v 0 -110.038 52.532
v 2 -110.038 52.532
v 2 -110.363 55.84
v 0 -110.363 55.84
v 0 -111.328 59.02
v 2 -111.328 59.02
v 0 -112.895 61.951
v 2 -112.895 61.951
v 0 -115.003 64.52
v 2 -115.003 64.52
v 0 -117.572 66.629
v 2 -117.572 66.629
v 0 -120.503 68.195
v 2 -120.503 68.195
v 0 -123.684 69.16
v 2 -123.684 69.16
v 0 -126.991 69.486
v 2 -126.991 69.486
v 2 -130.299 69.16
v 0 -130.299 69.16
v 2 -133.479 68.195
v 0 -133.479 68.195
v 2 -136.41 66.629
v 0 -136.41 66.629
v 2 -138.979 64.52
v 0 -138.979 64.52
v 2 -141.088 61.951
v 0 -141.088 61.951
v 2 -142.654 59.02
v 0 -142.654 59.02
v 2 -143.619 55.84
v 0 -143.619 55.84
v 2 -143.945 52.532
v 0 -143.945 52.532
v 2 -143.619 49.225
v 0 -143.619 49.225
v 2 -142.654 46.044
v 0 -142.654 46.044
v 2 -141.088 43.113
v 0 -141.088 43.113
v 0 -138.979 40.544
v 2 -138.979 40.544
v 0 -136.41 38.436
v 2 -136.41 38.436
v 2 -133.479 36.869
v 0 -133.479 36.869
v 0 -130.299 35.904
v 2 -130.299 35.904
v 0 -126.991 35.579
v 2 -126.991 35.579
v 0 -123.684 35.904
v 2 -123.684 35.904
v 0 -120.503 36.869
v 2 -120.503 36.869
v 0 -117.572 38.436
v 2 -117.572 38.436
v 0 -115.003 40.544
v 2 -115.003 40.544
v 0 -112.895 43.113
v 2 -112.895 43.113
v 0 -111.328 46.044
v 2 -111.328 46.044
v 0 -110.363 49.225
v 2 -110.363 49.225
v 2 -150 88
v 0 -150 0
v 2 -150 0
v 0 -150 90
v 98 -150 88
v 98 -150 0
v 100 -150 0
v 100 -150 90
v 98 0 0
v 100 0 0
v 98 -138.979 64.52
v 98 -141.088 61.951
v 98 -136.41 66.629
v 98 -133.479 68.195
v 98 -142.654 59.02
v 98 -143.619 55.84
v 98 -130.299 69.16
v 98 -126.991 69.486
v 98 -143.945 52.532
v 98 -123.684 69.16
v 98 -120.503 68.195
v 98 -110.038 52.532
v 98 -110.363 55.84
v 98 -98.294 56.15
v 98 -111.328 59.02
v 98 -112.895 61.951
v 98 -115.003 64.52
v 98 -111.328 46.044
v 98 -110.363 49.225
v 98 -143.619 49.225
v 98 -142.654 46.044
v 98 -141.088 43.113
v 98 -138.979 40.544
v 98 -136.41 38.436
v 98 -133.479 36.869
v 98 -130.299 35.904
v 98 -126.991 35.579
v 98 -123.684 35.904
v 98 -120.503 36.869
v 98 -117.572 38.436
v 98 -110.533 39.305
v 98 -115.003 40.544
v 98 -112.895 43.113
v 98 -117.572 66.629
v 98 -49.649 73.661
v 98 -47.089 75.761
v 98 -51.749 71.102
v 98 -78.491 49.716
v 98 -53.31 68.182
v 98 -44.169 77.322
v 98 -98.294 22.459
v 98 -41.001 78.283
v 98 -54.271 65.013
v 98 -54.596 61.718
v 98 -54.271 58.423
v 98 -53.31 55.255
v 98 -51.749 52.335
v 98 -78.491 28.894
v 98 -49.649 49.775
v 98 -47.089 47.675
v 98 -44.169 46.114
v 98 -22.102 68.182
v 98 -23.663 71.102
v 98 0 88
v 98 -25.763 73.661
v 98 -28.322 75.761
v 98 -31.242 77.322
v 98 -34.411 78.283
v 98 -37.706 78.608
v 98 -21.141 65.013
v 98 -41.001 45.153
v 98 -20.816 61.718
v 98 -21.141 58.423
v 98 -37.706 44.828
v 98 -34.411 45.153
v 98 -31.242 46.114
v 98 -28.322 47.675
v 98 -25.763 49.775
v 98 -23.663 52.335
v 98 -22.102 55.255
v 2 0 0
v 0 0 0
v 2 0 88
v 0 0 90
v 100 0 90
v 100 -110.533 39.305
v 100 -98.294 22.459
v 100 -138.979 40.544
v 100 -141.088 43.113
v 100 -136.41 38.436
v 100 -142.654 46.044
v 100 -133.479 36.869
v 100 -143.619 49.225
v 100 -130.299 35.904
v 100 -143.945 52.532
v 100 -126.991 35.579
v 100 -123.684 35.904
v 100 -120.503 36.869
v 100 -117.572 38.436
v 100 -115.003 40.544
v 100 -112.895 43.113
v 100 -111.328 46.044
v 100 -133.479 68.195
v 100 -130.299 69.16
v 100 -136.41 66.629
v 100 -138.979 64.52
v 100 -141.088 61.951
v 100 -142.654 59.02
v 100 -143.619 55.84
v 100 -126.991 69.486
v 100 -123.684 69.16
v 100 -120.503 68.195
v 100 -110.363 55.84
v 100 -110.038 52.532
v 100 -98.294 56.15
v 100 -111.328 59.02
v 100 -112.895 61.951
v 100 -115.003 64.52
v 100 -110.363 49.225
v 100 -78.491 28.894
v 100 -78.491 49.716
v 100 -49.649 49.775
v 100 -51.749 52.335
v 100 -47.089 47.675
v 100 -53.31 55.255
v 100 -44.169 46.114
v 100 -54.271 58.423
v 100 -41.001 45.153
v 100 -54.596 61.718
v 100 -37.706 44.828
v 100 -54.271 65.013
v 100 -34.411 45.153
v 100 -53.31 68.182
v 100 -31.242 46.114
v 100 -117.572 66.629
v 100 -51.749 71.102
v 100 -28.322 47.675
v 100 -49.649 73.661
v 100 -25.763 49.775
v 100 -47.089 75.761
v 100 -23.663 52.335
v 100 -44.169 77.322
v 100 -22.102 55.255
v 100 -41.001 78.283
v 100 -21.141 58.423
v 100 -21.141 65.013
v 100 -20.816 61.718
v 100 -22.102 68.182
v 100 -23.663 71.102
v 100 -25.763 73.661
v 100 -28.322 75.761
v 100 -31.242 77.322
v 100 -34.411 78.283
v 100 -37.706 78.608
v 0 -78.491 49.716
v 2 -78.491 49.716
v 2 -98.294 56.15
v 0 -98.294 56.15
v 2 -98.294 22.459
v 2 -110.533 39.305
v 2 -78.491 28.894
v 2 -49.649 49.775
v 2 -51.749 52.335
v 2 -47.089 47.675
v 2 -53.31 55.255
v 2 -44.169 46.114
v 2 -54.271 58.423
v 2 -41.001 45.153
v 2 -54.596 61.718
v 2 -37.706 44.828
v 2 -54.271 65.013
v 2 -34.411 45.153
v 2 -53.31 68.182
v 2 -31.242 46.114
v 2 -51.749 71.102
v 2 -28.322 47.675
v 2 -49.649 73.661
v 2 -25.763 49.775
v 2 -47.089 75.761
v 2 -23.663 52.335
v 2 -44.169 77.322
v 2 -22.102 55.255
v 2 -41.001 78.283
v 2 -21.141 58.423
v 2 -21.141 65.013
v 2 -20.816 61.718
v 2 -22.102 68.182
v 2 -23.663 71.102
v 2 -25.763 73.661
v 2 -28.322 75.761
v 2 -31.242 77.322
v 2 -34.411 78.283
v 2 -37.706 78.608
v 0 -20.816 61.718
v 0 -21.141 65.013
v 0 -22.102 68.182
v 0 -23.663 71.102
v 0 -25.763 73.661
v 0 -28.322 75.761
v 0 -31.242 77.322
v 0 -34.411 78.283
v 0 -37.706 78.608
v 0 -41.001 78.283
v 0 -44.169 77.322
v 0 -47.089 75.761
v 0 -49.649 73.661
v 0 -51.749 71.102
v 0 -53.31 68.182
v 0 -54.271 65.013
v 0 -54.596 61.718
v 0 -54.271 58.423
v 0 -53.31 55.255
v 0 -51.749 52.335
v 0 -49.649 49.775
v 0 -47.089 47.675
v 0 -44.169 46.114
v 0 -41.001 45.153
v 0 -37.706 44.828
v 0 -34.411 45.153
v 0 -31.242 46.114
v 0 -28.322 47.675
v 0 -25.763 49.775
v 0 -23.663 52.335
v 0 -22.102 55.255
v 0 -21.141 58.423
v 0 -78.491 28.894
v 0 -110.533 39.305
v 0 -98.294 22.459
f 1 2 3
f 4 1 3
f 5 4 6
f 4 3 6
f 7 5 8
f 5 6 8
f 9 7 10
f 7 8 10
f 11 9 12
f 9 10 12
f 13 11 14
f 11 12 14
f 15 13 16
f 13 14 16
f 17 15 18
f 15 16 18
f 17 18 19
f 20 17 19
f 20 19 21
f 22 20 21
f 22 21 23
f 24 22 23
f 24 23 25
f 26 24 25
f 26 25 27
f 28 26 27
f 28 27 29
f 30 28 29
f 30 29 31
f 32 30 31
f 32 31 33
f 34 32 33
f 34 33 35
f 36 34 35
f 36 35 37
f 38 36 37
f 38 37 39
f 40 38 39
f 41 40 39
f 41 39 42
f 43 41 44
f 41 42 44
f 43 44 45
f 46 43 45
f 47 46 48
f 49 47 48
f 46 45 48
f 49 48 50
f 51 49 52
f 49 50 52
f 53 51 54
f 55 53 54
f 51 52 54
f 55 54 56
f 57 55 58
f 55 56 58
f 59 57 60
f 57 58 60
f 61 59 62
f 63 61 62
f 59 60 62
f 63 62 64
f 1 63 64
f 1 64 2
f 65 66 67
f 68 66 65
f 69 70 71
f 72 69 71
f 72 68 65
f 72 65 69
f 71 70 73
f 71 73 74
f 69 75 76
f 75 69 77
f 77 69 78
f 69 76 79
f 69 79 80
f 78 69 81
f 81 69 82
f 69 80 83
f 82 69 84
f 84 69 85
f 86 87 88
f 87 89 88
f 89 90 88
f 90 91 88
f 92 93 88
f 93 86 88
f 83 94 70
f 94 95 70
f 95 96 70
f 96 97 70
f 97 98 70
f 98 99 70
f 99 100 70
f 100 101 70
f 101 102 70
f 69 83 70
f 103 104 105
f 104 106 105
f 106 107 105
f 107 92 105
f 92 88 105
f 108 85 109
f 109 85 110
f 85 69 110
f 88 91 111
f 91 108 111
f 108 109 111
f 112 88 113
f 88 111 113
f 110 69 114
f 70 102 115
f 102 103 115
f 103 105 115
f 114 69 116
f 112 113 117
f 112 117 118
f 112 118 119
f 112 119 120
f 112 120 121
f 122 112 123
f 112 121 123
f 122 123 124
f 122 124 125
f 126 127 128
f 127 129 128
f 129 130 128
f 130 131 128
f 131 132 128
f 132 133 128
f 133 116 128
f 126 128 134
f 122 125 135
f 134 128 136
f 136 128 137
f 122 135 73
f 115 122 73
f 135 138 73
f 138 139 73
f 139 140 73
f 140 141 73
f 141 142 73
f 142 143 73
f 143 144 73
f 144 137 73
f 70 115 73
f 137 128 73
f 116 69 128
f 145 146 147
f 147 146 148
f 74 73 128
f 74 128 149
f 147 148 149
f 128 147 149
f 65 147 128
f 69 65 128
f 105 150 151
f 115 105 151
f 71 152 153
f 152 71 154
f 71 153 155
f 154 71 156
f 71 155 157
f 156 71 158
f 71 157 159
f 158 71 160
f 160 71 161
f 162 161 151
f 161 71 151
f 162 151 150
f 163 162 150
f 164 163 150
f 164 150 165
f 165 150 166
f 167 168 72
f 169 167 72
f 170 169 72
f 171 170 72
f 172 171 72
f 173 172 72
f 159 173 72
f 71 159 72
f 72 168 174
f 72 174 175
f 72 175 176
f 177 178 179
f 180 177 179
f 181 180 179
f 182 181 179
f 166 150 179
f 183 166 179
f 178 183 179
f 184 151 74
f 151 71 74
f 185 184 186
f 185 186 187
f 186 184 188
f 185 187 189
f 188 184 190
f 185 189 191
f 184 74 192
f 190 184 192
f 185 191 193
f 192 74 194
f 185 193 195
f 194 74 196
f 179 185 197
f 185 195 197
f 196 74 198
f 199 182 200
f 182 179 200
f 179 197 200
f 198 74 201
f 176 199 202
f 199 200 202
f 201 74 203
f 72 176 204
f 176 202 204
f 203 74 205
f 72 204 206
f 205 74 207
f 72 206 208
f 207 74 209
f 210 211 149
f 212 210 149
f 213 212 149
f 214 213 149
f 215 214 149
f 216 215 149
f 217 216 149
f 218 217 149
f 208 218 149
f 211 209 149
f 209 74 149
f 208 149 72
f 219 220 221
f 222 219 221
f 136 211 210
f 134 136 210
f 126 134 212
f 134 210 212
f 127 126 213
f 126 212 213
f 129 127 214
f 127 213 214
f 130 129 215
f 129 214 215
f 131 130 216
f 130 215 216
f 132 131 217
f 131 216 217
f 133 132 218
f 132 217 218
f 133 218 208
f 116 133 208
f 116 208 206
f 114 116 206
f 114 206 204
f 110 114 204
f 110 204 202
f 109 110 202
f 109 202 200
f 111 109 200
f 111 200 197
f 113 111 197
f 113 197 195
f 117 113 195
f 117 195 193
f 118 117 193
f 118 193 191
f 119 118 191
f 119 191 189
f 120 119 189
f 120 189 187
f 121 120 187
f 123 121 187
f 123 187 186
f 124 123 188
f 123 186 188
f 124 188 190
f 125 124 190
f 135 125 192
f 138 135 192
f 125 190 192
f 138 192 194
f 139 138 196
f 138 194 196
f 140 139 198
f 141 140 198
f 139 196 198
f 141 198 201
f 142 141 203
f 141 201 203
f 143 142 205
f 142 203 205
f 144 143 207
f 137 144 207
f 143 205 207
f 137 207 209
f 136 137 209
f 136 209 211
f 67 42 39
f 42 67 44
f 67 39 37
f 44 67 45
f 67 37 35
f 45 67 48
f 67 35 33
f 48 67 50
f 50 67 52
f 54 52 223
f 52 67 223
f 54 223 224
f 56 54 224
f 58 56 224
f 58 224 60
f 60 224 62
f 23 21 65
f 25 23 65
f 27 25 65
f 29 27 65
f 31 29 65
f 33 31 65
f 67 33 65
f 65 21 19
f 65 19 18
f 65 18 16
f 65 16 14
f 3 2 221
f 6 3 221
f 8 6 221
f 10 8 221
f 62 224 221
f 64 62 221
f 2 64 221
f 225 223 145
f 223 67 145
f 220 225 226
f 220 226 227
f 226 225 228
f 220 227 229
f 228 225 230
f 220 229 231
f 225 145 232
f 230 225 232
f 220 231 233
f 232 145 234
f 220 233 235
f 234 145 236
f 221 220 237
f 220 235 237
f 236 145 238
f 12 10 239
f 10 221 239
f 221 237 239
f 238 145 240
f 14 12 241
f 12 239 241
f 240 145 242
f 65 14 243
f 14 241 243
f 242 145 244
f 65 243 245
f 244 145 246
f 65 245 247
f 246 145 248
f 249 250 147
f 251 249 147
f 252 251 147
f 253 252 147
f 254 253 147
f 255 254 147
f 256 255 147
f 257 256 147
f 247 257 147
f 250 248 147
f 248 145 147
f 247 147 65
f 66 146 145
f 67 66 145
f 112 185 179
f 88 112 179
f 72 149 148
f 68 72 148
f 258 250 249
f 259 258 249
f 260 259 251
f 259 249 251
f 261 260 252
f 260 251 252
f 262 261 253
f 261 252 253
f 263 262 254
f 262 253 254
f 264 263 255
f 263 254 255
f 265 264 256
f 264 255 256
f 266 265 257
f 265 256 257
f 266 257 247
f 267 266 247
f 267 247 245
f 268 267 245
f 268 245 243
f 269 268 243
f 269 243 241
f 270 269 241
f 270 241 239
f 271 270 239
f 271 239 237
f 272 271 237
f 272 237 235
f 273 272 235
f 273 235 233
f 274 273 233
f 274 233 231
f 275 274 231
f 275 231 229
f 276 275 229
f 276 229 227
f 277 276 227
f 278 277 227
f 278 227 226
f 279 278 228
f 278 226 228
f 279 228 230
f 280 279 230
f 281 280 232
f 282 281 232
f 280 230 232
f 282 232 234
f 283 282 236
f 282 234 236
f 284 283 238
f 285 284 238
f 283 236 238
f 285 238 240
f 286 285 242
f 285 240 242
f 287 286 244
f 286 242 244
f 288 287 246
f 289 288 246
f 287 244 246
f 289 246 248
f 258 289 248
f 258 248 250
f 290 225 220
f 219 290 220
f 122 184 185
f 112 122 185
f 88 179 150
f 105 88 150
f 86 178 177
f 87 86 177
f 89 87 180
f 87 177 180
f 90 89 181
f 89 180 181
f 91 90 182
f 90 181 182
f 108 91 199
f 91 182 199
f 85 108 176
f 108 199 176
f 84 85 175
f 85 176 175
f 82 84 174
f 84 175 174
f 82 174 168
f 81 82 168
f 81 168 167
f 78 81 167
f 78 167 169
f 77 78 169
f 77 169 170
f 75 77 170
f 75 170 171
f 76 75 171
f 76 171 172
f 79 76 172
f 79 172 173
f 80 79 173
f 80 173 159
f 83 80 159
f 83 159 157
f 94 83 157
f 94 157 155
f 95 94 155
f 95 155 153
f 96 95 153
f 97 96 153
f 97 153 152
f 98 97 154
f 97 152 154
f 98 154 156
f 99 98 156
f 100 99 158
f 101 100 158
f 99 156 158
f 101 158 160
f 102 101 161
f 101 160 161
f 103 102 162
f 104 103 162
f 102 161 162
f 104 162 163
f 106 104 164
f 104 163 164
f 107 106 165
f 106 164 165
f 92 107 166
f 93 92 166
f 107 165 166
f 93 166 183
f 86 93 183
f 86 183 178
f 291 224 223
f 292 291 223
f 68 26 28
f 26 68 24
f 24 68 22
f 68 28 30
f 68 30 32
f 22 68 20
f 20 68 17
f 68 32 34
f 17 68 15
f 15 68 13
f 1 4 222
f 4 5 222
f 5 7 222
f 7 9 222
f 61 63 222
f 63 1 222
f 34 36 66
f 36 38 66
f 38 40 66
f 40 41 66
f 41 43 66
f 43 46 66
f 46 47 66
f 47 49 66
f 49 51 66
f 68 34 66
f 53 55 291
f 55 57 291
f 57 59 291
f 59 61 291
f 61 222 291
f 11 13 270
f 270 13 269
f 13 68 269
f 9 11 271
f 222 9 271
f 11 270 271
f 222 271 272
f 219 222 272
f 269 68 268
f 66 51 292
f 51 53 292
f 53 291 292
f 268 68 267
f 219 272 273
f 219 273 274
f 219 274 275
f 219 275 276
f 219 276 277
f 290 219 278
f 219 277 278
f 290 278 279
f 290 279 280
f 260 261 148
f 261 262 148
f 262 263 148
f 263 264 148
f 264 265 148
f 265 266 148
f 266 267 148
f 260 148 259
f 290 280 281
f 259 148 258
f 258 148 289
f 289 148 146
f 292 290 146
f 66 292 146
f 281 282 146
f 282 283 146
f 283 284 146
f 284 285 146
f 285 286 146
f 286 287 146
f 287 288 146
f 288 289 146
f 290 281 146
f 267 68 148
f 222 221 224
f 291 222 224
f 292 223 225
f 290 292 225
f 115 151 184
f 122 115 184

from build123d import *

# Parameters (mm, degrees)
F1_DEPTH = 150
F2_R     = 16.95362
F2_R_2   = 16.889789
F3_DEPTH = 100


with BuildPart() as f1:
    # F0 (on Front) → F1 (new body)
    with BuildSketch(Plane.XZ):
        Polygon((0, 90), (0, 0), (2, 0), (2, 88), (98, 88), (98, 0), (100, 0), (100, 90), align=None)
    extrude(amount=F1_DEPTH)

    # F2 (on face) → F3 (cut)
    with BuildSketch(Plane.YZ.offset(100)):
        with Locations((-126.991346, 52.532315)):
            Circle(F2_R)
        with Locations((-37.705854, 61.718065)):
            Circle(F2_R_2)
        Polygon((-78.490585, 28.893651), (-78.490585, 49.716024), (-98.293838, 56.150491), (-110.532922, 39.304838), (-98.293838, 22.459184), align=None)
    extrude(amount=-F3_DEPTH, mode=Mode.SUBTRACT)


solid = f1.part
